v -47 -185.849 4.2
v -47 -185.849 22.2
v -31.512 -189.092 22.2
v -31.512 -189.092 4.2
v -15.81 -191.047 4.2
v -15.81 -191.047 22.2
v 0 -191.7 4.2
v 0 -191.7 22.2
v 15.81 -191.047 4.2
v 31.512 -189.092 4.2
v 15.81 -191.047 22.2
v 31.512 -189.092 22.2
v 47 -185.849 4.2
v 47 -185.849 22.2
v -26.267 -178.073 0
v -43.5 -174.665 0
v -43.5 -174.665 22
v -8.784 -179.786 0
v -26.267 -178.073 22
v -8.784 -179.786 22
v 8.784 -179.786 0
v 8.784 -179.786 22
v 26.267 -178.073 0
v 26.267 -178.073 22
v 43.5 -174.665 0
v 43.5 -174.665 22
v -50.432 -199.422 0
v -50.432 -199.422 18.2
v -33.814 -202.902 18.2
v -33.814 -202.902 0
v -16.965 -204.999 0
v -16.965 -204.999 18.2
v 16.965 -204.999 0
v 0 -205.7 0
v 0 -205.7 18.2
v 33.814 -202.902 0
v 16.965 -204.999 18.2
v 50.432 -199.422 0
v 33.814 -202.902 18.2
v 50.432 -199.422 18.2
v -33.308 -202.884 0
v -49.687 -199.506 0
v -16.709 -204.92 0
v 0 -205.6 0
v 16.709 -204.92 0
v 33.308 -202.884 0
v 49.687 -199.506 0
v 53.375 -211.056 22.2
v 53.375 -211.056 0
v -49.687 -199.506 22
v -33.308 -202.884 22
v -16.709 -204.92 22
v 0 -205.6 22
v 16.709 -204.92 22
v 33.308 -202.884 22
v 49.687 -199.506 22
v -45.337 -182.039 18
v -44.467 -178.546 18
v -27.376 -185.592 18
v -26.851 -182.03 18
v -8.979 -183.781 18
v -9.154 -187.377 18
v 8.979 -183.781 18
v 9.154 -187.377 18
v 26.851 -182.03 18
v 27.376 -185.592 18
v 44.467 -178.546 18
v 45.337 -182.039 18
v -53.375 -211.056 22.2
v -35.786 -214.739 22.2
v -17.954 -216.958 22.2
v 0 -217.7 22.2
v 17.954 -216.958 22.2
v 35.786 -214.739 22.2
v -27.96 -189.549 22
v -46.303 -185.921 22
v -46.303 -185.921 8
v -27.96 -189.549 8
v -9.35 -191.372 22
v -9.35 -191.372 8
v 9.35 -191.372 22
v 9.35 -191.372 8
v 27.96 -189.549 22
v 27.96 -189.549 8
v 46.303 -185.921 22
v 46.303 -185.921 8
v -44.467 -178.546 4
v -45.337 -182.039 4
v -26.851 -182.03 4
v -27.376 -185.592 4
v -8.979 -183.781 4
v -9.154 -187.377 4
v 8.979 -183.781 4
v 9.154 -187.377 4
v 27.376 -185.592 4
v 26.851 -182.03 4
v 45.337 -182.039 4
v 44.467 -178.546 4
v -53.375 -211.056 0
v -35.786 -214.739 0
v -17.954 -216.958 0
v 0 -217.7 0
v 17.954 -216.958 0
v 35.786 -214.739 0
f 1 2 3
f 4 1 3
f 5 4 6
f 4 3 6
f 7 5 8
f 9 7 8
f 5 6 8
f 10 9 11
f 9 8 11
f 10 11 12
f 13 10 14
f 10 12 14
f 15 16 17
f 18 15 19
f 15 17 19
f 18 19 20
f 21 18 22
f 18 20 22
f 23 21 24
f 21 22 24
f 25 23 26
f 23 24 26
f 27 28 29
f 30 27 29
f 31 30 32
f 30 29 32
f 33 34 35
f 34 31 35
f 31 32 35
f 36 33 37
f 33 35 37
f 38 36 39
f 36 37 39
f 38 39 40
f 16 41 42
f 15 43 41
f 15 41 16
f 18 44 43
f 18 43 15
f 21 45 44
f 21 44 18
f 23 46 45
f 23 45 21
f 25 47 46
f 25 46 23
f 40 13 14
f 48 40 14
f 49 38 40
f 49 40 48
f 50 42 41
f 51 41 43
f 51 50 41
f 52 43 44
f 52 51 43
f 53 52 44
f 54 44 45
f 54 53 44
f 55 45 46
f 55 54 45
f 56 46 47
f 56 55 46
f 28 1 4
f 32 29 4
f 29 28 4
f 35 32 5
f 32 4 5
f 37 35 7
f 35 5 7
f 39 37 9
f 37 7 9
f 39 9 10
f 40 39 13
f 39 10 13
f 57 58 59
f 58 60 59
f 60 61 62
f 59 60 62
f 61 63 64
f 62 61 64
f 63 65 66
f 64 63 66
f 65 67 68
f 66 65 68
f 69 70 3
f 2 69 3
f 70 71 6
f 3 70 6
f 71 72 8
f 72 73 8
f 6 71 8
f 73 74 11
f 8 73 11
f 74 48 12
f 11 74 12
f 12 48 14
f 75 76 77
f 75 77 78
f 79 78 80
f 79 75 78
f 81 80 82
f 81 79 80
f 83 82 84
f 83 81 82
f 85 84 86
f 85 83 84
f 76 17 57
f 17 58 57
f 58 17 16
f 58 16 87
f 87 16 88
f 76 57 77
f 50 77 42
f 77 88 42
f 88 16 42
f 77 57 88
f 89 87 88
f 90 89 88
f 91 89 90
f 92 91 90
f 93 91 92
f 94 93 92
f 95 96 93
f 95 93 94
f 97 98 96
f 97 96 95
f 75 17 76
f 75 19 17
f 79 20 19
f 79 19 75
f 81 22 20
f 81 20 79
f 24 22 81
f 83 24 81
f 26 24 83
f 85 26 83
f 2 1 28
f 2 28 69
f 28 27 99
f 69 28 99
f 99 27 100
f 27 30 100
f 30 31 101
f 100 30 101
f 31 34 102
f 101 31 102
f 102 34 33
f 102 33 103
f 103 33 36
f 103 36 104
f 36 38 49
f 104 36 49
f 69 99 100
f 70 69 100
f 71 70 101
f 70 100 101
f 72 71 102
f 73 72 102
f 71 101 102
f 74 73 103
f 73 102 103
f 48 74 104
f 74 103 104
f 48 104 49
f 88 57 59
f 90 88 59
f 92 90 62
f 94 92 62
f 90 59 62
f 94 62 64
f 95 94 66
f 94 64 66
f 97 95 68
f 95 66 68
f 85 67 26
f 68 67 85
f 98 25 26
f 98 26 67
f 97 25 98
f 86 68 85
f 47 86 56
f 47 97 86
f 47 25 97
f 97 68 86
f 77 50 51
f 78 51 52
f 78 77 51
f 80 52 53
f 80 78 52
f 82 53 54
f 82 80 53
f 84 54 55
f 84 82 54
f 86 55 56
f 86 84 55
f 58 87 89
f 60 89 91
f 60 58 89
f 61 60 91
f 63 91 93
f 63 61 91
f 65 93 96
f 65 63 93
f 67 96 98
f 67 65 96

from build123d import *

# Parameters (mm, degrees)
SKETCH_W        = 3.6
SKETCH_H        = 14
POCKET_DEPTH    = 22.001
POCKET001_DEPTH = 22.201


with BuildPart() as chairmount:
    # Sketch → Revolution (revolve)
    with BuildSketch(Plane.YZ):
        Polygon((-205.6, 0), (-205.6, 22), (-191.6, 8), (-191.6, 22), (-180, 22), (-180, 4), (-180, 0), align=None)
        with Locations((-185.8, 11)):
            Rectangle(SKETCH_W, SKETCH_H, mode=Mode.SUBTRACT)
    revolve(axis=Axis((0, 0, 0), (0, 0, 1)))

    # Sketch001 → Pocket (cut, through all)
    with BuildSketch(Plane.XY):
        with BuildLine():
            ThreePointArc((49.6866666666, -199.5058774959), (0, 205.5999999997), (-49.6866666666, -199.5058774959))
            Line((0, 0), (-49.6866666665, -199.5058774959))
            Line((0, 0), (49.6866666665, -199.5058774959))
        make_face()
    extrude(amount=POCKET_DEPTH, mode=Mode.SUBTRACT)


with BuildPart() as extmount:
    # Sketch002 → Revolution001 (revolve)
    with BuildSketch(Plane.YZ):
        Polygon((-205.7, 18.2), (-191.7, 4.2), (-191.7, 18.2), (-191.7, 22.2), (-217.7, 22.2), (-217.7, 0), (-205.7, 0), align=None)
    revolve(axis=Axis((0, 0, 0), (0, 0, 1)))

    # Sketch003 → Pocket001 (cut, through all)
    with BuildSketch(Plane.XY):
        with BuildLine():
            ThreePointArc((53.3745435576, -211.0555569039), (0, 217.7), (-53.3745435576, -211.0555569039))
            Line((0, 0), (-53.3745435576, -211.0555569039))
            Line((0, 0), (53.3745435576, -211.0555569039))
        make_face()
    extrude(amount=POCKET001_DEPTH, mode=Mode.SUBTRACT)


solid = Compound([chairmount.part, extmount.part])
